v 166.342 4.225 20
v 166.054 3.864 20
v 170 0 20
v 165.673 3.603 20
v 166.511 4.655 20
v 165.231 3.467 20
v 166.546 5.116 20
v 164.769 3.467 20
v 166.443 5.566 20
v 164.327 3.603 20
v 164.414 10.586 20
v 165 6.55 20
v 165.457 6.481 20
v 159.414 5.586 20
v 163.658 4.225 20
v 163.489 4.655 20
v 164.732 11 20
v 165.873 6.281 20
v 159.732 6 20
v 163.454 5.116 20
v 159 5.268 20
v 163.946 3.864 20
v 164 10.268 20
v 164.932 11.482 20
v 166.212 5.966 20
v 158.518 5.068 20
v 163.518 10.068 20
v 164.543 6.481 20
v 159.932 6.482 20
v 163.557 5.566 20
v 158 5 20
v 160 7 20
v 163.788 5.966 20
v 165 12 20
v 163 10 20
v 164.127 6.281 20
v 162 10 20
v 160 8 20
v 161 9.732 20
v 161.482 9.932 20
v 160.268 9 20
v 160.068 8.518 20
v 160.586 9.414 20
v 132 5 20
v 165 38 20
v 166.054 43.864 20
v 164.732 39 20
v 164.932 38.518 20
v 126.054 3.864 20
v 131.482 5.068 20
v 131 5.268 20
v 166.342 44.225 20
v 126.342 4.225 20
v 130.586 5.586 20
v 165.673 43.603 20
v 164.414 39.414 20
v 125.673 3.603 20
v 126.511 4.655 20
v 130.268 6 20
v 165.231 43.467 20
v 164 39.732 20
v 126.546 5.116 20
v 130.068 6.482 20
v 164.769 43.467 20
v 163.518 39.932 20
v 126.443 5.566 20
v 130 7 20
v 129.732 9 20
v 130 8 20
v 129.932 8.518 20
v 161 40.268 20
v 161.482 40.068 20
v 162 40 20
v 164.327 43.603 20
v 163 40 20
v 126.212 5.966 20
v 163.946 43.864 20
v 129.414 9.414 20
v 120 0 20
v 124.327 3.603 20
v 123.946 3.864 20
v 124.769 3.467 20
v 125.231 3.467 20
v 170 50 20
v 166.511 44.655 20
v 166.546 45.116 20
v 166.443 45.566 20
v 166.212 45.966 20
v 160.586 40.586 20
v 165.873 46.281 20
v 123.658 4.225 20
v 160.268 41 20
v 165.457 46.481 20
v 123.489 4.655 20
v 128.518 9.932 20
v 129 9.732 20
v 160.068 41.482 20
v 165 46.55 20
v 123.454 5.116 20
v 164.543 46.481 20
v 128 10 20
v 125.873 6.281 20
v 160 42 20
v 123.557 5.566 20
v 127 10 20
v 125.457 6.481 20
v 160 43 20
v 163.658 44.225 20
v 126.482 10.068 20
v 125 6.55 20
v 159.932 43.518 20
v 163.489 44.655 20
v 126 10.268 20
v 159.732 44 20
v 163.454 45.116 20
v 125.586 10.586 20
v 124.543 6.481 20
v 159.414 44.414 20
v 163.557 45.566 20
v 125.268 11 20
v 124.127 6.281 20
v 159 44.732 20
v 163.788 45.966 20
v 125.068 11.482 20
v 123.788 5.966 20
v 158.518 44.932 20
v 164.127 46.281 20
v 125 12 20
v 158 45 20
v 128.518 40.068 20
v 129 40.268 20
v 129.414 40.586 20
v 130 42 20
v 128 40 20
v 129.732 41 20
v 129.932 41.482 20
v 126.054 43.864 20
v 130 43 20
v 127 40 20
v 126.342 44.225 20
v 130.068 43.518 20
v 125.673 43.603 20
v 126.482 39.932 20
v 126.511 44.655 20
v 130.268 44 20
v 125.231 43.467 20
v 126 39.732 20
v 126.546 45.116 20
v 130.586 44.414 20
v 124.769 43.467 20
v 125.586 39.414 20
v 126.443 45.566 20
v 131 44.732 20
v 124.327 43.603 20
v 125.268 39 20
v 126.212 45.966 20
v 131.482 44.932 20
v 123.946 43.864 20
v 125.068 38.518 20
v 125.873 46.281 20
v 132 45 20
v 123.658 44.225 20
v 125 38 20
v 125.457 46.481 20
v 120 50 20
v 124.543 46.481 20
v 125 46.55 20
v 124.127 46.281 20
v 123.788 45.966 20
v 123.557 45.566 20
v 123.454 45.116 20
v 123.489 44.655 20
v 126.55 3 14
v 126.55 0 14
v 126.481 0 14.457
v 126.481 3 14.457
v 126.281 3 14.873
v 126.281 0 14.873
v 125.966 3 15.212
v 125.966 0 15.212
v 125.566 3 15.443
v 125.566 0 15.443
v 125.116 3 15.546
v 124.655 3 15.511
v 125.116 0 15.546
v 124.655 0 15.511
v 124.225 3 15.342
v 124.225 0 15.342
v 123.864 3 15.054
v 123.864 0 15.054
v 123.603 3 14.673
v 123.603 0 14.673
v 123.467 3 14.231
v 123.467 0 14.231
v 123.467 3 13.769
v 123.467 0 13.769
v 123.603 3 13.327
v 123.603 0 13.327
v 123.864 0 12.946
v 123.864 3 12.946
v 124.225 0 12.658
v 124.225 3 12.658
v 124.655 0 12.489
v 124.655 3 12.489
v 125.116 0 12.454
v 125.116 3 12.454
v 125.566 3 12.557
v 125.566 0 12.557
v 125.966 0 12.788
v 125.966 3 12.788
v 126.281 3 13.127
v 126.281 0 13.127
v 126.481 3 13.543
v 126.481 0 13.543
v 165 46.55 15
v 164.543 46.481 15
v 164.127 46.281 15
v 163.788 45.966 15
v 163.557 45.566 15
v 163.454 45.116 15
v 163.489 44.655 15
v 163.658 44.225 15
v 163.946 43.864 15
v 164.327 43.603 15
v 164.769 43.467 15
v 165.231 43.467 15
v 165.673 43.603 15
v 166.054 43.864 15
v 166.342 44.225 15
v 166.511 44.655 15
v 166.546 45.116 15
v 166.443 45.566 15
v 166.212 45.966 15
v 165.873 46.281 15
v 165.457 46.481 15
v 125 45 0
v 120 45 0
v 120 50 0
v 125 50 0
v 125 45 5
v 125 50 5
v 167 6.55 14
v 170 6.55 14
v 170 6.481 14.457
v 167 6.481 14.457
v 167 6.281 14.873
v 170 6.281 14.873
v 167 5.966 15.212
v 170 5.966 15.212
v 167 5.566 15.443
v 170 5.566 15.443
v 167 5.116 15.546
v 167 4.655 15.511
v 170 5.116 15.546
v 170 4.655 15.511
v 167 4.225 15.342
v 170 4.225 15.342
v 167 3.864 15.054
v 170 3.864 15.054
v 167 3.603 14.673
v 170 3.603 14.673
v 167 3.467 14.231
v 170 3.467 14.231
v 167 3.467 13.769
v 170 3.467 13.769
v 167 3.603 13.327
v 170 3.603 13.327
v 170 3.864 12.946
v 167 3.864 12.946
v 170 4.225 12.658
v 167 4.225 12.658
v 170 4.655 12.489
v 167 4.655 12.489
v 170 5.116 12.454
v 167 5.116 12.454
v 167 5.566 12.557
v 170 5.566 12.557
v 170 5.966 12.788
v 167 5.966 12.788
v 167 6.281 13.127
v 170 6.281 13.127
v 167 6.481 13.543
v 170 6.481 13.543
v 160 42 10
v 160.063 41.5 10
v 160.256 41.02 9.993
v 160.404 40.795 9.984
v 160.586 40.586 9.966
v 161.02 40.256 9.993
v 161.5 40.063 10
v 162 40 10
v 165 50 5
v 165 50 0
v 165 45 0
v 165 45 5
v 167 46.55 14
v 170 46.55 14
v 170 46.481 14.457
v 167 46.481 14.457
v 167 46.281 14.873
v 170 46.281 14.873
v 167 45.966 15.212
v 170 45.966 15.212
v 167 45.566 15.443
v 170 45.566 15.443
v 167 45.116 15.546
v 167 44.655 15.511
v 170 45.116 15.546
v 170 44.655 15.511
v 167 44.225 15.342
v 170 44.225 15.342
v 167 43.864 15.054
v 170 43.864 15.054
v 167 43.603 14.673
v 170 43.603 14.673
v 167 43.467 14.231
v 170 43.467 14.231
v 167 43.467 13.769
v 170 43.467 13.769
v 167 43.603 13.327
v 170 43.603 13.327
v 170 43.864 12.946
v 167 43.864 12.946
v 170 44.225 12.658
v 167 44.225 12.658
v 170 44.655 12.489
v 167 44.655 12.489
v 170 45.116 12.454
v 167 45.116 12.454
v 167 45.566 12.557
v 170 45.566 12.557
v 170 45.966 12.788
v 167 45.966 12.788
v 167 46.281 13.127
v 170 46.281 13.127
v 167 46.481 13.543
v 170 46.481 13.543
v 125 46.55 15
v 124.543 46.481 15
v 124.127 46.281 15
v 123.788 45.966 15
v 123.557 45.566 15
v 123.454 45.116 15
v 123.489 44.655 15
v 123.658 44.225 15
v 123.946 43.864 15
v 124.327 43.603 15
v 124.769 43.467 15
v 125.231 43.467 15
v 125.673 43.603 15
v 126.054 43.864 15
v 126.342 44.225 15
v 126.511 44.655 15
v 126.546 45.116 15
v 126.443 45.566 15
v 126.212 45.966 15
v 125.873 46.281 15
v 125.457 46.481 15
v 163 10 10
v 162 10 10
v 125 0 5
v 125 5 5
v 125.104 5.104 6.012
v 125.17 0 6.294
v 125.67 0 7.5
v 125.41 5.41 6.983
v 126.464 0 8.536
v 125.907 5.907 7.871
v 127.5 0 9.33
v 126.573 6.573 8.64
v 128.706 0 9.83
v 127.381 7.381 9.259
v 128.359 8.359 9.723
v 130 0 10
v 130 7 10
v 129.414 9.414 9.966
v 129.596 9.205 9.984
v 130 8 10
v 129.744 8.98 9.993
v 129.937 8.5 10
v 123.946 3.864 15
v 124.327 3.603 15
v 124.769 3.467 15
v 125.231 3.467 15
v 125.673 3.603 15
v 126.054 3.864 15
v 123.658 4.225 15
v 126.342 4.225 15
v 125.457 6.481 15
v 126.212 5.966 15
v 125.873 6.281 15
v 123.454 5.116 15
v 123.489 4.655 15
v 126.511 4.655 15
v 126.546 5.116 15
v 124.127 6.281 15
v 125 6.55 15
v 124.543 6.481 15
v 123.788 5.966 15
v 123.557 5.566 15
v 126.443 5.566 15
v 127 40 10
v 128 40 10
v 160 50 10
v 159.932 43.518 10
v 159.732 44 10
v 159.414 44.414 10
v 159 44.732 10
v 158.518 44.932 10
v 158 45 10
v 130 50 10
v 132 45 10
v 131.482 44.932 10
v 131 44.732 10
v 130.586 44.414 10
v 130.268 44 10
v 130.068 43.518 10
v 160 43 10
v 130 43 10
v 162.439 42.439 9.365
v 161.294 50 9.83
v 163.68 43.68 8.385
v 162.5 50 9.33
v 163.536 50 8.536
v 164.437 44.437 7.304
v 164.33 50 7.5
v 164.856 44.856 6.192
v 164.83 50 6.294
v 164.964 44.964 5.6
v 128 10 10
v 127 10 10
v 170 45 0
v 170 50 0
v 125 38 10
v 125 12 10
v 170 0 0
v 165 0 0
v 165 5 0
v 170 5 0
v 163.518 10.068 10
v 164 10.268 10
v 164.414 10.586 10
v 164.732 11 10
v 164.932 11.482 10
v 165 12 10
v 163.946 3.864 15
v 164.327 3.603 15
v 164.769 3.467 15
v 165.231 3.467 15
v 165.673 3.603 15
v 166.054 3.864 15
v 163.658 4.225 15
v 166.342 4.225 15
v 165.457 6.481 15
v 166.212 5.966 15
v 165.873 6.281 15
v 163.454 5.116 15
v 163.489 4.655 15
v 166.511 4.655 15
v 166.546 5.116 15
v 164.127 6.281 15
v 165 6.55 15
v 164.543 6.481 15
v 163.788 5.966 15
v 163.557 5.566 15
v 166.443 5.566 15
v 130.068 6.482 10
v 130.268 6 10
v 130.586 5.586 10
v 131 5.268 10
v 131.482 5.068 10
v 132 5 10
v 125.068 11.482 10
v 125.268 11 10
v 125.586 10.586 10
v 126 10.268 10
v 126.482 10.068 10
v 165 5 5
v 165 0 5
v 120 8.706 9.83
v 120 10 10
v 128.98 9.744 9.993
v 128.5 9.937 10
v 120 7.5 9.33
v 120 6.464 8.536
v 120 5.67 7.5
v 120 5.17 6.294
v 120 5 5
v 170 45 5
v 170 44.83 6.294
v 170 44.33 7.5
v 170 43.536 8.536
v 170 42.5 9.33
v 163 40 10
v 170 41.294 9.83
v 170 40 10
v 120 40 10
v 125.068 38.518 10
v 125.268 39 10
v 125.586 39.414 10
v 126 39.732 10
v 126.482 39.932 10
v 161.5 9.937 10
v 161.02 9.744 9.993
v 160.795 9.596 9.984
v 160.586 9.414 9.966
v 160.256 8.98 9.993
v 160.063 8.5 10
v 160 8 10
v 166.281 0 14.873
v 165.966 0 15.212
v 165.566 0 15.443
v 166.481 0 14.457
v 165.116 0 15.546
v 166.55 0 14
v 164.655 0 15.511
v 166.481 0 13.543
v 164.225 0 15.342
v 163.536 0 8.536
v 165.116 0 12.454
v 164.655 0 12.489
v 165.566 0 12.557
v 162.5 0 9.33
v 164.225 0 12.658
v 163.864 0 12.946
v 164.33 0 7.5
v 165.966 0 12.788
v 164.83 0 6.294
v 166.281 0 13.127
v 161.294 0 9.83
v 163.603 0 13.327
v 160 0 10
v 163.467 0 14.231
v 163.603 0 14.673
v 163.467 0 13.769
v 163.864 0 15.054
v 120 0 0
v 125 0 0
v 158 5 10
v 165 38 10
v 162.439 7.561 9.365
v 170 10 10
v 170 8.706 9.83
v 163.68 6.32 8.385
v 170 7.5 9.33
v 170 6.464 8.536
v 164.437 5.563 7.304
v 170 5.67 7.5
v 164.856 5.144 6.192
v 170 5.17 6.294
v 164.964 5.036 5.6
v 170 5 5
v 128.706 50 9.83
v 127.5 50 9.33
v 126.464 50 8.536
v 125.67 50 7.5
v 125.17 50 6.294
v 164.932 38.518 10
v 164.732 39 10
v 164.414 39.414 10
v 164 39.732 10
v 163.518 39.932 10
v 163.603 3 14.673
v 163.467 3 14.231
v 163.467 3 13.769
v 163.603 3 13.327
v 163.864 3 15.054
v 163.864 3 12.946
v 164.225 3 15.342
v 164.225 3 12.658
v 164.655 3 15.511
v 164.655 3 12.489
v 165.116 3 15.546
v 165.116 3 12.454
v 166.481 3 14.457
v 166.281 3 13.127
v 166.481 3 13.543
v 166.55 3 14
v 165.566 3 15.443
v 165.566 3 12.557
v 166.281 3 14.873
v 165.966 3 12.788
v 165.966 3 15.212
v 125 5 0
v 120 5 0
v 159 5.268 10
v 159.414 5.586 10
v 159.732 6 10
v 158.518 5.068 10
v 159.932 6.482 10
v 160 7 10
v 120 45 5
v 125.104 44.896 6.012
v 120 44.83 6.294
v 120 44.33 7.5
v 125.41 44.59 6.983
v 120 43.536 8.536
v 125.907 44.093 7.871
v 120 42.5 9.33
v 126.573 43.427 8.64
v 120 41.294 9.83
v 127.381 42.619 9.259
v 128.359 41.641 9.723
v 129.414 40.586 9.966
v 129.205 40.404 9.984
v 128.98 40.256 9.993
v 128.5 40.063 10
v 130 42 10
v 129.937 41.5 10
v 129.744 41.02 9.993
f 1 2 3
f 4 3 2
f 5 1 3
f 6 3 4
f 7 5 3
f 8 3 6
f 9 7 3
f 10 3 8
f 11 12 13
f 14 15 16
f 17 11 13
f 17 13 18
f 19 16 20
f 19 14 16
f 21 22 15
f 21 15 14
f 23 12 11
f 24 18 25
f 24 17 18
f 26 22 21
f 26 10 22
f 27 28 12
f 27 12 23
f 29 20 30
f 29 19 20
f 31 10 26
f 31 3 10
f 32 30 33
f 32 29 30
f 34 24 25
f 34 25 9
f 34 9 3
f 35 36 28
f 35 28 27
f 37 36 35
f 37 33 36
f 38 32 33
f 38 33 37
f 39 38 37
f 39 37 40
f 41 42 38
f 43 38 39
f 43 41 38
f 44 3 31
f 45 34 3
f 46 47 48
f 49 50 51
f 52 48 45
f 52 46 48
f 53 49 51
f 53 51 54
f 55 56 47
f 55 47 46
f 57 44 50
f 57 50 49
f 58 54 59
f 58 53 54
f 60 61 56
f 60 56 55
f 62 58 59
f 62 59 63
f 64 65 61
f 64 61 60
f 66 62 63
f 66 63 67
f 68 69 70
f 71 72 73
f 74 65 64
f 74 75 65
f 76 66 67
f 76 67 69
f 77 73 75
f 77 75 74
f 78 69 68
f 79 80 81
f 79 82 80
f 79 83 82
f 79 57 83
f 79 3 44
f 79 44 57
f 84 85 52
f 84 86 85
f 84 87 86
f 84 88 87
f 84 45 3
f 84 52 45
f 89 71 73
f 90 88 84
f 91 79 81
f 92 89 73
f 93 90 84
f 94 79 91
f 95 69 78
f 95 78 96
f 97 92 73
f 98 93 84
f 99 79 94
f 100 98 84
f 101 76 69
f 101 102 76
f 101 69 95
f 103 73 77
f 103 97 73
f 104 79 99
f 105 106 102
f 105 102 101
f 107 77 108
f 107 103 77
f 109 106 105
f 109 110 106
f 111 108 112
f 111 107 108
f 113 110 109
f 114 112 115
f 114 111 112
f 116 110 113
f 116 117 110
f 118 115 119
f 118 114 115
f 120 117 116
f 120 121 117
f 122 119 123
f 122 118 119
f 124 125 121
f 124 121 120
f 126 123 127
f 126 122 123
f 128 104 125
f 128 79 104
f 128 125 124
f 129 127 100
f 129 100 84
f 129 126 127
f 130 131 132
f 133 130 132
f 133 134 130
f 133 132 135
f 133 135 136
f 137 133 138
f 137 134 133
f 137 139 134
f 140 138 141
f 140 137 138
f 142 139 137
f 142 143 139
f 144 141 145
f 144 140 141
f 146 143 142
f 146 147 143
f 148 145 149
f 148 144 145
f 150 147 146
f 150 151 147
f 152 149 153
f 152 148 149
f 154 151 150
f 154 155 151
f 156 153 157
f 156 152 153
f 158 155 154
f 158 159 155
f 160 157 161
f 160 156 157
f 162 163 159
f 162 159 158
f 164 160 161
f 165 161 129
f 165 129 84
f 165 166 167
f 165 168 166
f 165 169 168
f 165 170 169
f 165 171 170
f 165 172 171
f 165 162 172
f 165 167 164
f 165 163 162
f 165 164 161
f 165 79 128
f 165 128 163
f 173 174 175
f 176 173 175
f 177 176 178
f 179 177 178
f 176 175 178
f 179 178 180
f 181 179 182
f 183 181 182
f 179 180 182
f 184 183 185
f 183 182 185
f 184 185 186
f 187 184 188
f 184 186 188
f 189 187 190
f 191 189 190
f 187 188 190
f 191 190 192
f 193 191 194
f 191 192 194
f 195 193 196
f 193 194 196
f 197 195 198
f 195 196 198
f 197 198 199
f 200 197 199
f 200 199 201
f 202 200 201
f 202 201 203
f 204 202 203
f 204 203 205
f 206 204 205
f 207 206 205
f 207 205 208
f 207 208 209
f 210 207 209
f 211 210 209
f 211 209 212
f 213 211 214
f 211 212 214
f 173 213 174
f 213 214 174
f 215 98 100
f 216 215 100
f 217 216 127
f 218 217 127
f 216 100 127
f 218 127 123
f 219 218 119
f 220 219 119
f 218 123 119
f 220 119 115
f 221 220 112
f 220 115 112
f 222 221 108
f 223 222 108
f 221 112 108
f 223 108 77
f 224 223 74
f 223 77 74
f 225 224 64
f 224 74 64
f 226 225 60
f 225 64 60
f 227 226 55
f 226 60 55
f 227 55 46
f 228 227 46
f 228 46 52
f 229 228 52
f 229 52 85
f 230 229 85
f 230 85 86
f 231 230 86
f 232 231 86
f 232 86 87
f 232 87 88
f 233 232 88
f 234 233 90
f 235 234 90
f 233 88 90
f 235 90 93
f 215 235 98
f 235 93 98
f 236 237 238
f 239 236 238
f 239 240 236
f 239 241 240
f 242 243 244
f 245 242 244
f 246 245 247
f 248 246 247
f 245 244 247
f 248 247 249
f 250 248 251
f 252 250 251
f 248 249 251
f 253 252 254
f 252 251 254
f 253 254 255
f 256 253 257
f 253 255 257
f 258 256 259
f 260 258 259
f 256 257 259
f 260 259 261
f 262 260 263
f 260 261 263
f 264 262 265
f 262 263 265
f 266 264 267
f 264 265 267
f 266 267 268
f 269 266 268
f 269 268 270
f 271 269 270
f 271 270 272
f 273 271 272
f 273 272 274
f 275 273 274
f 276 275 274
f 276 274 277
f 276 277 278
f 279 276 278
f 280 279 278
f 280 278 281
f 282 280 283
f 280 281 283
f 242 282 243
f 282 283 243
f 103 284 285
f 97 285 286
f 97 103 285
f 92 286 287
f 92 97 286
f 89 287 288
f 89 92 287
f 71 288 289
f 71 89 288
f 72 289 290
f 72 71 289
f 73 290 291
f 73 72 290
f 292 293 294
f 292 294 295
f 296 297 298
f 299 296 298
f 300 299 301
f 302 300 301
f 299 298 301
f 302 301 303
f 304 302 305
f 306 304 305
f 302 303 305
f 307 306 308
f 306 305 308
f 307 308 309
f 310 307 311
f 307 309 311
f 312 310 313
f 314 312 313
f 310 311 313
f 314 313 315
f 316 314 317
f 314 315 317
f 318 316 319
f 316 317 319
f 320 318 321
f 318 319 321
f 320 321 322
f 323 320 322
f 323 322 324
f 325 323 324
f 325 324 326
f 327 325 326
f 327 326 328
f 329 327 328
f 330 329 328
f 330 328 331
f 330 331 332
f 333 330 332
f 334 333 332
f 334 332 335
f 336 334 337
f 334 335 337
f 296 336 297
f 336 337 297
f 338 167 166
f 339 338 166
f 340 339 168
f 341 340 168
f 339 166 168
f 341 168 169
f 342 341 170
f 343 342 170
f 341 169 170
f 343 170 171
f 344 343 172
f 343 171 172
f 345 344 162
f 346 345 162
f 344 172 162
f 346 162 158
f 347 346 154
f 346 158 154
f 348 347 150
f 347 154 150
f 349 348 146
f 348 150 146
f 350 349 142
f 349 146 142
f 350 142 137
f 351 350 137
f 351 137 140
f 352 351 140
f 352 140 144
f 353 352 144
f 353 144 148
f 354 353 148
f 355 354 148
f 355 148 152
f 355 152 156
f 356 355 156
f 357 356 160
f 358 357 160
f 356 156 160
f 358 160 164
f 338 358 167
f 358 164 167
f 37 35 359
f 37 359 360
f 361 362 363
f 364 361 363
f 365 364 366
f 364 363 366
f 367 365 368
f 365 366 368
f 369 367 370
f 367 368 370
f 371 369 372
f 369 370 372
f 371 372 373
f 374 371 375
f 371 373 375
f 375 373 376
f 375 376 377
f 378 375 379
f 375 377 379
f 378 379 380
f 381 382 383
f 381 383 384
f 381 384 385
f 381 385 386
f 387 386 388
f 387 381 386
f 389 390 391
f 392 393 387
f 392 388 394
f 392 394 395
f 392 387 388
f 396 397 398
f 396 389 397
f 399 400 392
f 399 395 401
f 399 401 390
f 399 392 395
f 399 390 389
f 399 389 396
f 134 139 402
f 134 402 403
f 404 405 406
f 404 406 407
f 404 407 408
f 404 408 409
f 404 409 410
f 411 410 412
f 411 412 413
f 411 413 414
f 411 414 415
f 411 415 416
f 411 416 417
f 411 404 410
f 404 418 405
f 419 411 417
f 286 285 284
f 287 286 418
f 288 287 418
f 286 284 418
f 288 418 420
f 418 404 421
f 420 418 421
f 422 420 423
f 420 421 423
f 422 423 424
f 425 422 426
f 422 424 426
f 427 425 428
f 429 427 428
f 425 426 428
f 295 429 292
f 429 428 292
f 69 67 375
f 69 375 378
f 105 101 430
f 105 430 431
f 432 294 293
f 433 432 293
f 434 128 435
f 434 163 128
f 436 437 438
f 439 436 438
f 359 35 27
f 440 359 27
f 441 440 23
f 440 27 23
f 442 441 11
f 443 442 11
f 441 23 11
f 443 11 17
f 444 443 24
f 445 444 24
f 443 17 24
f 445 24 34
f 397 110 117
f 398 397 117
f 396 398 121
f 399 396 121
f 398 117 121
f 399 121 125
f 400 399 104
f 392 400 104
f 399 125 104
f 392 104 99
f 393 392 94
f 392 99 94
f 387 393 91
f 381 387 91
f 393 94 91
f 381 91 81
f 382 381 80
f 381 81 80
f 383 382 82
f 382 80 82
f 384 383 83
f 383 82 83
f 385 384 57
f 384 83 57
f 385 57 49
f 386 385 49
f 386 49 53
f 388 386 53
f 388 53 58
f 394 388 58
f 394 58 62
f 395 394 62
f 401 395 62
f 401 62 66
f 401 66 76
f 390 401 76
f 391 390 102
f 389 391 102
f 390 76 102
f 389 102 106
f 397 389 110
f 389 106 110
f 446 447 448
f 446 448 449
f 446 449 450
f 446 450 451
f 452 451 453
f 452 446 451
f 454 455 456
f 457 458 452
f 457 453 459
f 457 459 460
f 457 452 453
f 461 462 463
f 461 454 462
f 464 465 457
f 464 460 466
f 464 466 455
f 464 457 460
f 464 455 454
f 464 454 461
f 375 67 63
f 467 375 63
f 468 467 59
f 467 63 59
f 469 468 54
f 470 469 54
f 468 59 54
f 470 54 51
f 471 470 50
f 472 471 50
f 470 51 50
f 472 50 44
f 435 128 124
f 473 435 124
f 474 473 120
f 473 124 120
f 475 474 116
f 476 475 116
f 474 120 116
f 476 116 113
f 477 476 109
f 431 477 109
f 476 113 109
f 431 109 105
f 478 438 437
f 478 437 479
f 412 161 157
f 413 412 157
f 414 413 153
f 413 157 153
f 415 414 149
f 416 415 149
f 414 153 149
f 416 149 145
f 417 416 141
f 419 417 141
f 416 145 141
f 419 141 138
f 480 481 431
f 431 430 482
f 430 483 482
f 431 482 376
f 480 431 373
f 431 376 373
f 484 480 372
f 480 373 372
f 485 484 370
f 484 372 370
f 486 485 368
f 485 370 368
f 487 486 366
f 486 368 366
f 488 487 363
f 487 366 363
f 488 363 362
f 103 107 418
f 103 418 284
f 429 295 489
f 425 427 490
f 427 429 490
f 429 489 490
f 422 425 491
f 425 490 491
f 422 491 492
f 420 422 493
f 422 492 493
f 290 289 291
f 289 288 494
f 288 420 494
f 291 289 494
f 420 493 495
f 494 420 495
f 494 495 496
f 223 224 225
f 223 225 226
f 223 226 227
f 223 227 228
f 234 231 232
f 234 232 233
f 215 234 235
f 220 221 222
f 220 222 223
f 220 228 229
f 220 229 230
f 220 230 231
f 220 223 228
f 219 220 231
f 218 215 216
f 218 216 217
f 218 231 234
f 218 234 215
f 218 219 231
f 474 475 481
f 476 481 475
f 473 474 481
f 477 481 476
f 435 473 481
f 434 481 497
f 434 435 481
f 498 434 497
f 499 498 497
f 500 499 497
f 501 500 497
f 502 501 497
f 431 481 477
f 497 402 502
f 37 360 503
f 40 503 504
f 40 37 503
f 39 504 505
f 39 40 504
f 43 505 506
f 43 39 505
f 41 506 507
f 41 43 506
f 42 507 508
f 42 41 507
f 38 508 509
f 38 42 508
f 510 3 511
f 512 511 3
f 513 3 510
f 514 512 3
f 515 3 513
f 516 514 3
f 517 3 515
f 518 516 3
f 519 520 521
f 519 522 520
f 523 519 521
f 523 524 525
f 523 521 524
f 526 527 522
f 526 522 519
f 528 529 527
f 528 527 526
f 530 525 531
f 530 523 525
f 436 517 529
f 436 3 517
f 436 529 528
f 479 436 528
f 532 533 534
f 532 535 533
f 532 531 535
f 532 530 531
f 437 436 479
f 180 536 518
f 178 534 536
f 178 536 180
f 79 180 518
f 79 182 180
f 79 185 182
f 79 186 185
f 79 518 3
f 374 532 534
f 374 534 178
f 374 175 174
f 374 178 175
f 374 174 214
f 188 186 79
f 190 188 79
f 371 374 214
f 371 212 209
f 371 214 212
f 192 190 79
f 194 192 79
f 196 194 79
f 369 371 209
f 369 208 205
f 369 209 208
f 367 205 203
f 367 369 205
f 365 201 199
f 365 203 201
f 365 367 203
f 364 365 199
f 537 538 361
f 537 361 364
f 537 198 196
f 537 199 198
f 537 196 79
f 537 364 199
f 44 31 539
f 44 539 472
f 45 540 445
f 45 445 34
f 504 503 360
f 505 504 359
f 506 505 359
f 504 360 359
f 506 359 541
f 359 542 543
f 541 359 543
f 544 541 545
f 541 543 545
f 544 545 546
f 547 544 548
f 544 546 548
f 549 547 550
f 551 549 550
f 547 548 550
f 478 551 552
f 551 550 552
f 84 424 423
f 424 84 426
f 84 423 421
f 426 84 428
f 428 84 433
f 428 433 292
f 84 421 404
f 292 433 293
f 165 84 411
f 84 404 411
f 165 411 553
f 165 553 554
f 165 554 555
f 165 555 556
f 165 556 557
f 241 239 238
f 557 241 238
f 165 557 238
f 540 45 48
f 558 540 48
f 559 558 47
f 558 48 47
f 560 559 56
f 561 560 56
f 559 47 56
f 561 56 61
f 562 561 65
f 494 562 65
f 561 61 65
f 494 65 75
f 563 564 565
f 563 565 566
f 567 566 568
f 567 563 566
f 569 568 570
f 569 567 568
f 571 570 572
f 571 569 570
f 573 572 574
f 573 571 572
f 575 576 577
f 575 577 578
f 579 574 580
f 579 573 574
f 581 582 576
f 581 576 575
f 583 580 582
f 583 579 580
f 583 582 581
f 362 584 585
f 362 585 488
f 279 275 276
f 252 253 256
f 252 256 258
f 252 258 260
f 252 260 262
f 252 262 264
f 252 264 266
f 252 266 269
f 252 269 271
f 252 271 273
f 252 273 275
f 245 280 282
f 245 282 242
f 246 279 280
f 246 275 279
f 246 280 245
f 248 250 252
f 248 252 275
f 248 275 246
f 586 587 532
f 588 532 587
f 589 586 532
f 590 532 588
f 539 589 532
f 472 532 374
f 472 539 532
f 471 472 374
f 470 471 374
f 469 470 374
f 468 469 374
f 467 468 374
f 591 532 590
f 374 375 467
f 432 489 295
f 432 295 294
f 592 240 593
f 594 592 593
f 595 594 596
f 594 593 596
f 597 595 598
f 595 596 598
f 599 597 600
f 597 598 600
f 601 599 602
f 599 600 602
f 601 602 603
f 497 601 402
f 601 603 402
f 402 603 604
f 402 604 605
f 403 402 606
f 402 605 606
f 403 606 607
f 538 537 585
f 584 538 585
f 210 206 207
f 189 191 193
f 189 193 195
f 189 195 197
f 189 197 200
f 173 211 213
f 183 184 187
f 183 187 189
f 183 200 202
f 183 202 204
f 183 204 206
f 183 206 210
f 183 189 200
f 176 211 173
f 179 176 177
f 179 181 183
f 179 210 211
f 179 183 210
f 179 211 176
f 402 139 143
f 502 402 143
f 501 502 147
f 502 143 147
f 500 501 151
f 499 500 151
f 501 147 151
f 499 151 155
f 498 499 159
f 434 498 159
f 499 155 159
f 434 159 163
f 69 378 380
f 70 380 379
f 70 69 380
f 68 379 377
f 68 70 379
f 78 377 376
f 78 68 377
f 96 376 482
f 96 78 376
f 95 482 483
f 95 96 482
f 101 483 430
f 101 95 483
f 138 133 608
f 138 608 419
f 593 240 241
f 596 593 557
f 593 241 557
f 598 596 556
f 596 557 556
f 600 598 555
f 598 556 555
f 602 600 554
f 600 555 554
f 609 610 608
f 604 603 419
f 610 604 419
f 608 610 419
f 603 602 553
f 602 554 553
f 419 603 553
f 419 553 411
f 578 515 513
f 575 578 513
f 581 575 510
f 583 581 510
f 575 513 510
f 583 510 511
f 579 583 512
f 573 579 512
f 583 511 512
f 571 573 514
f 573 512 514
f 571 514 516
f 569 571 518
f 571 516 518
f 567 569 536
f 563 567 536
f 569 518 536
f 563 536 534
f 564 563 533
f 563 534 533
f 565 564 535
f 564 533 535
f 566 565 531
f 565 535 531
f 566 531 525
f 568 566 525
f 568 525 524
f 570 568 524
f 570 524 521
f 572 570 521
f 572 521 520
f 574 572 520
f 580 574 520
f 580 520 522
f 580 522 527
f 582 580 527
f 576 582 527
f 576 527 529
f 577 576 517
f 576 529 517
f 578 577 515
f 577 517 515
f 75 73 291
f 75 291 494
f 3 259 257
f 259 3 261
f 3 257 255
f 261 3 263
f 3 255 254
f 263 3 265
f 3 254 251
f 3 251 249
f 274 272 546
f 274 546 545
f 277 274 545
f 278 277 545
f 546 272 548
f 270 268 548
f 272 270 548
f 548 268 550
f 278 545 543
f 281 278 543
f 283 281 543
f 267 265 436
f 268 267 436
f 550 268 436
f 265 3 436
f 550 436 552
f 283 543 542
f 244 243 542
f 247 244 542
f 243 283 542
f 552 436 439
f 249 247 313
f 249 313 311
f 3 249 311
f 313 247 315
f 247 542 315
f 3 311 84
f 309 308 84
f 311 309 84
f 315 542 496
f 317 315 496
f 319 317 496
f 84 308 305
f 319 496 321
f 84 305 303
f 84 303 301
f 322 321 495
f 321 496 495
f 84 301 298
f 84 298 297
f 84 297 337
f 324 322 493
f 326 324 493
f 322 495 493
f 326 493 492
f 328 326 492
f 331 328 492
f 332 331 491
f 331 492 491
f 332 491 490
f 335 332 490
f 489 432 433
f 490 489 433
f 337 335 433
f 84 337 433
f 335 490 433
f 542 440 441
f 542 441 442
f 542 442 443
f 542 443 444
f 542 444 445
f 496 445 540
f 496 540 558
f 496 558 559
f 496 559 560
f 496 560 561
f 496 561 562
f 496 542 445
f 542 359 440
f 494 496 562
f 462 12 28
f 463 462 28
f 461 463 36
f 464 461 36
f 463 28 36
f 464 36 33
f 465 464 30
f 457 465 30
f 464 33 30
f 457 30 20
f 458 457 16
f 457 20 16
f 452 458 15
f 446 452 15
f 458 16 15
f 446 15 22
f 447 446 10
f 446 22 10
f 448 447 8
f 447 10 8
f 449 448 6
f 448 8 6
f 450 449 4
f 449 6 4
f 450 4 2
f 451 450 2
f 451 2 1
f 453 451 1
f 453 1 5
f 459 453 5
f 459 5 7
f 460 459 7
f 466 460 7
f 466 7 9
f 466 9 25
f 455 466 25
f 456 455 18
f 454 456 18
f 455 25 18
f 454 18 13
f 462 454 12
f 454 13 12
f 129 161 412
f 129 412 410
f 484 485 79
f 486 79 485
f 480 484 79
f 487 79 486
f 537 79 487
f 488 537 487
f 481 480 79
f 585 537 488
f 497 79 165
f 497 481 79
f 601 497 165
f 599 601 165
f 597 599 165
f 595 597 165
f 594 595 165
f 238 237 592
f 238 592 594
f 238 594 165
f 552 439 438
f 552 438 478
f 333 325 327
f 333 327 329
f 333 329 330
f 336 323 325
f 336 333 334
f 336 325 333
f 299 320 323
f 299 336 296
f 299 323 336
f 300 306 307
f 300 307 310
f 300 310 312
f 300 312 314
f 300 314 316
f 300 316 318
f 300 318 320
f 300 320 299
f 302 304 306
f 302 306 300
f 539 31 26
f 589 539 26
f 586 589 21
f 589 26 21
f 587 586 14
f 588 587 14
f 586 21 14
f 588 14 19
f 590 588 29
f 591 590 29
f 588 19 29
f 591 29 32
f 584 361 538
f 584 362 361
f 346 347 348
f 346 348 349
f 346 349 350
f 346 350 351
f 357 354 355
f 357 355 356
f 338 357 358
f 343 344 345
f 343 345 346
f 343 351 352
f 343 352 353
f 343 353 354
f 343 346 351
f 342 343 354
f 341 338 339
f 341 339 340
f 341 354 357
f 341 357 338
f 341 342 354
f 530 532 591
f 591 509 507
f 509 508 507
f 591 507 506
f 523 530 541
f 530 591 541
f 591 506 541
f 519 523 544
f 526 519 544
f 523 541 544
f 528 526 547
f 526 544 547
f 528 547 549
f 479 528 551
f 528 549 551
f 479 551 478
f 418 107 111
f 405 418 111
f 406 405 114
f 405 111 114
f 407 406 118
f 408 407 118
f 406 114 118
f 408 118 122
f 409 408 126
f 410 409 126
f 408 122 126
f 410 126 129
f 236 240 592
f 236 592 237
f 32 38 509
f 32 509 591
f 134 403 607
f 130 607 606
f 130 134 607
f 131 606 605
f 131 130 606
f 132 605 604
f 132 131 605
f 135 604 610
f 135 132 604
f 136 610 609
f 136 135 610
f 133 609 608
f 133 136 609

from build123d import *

# Parameters (mm, degrees)
SKETCH100_W             = 50
SKETCH100_H             = 50
PAD017_DEPTH            = 20
POCKET084_DEPTH         = 20.001
POCKET085_DEPTH         = 50.001
POCKET086_DEPTH         = 50.001
SKETCH104_R             = 1.55
POCKET087_DEPTH         = 5
SKETCH105_R             = 1.55
POCKET088_DEPTH         = 3
SKETCH106_R             = 1.55
POCKET089_DEPTH         = 3
BODY018_PLACEMENT_ANGLE = 90


with BuildPart() as part:
    # Sketch100 → Pad017 (new body)
    with BuildSketch(Plane.XY):
        Rectangle(SKETCH100_W, SKETCH100_H)
    extrude(amount=PAD017_DEPTH)

    # Sketch101 (on Face6 of Pad017) → Pocket084 (cut, through all)
    with BuildSketch(Plane.XY.offset(20)):
        with BuildLine():
            Line((-18, 15), (-17, 15))
            ThreePointArc((-17, 15), (-15.585786, 15.585786), (-15, 17))
            Line((-15, 17), (-15, 18))
            ThreePointArc((-13, 20), (-14.414214, 19.414214), (-15, 18))
            Line((-13, 20), (13, 20))
            ThreePointArc((15, 18), (14.414214, 19.414214), (13, 20))
            Line((15, 18), (15, 17))
            ThreePointArc((15, 17), (15.585786, 15.585786), (17, 15))
            Line((17, 15), (18, 15))
            ThreePointArc((20, 13), (19.414214, 14.414214), (18, 15))
            Line((20, 13), (20, -13))
            ThreePointArc((18, -15), (19.414214, -14.414214), (20, -13))
            Line((18, -15), (17, -15))
            ThreePointArc((17, -15), (15.585786, -15.585786), (15, -17))
            Line((15, -17), (15, -18))
            ThreePointArc((13, -20), (14.414214, -19.414214), (15, -18))
            Line((13, -20), (-13, -20))
            ThreePointArc((-15, -18), (-14.414214, -19.414214), (-13, -20))
            Line((-15, -18), (-15, -17))
            ThreePointArc((-15, -17), (-15.585786, -15.585786), (-17, -15))
            Line((-17, -15), (-18, -15))
            ThreePointArc((-20, -13), (-19.414214, -14.414214), (-18, -15))
            Line((-20, -13), (-20, 13))
            ThreePointArc((-18, 15), (-19.414214, 14.414214), (-20, 13))
        make_face()
    extrude(amount=-POCKET084_DEPTH, mode=Mode.SUBTRACT)

    # Sketch102 (on Face3 of Pocket084) → Pocket085 (cut, through all)
    with BuildSketch(Plane.YZ.offset(25)):
        with BuildLine():
            Line((-15, 10), (15, 10))
            ThreePointArc((20, 5), (18.535534, 8.535534), (15, 10))
            Line((20, 5), (20, 0))
            Line((20, 0), (-20, 0))
            Line((-20, 0), (-20, 5))
            ThreePointArc((-15, 10), (-18.535534, 8.535534), (-20, 5))
        make_face()
    extrude(amount=-POCKET085_DEPTH, mode=Mode.SUBTRACT)

    # Sketch103 (on Face6 of Pocket084) → Pocket086 (cut, through all)
    with BuildSketch(Plane.XZ.offset(25)):
        with BuildLine():
            Line((-15, 10), (15, 10))
            ThreePointArc((20, 5), (18.535534, 8.535534), (15, 10))
            Line((20, 5), (20, 0))
            Line((20, 0), (-20, 0))
            Line((-20, 0), (-20, 5))
            ThreePointArc((-15, 10), (-18.535534, 8.535534), (-20, 5))
        make_face()
    extrude(amount=-POCKET086_DEPTH, mode=Mode.SUBTRACT)

    # Sketch104 → Pocket087 (cut)
    with BuildSketch(Plane.XY.offset(20)):
        with Locations((-20, 20)):
            Circle(SKETCH104_R)
        with Locations((20, 20)):
            Circle(SKETCH104_R)
        with Locations((20, -20)):
            Circle(SKETCH104_R)
        with Locations((-20, -20)):
            Circle(SKETCH104_R)
    extrude(amount=-POCKET087_DEPTH, mode=Mode.SUBTRACT)

    # Sketch105 (on Face27 of Pocket087) → Pocket088 (cut)
    with BuildSketch(Plane.XZ.offset(25)):
        with Locations((-20, 14)):
            Circle(SKETCH105_R)
        with Locations((20, 14)):
            Circle(SKETCH105_R)
    extrude(amount=-POCKET088_DEPTH, mode=Mode.SUBTRACT)

    # Sketch106 (on Face11 of Pocket088) → Pocket089 (cut)
    with BuildSketch(Plane(origin=(-25, 0, 0), x_dir=(0, -1, 0), z_dir=(-1, 0, 0))):
        with Locations((-20, 14)):
            Circle(SKETCH106_R)
        with Locations((20, 14)):
            Circle(SKETCH106_R)
    extrude(amount=-POCKET089_DEPTH, mode=Mode.SUBTRACT)


with BuildPart() as part_1:
    # Body018 placement: moved
    add(part.part.moved(Location((145, 25, 0))).rotate(Axis((145, 25, 0), (0, 0, 1)), BODY018_PLACEMENT_ANGLE))


solid = part_1.part
